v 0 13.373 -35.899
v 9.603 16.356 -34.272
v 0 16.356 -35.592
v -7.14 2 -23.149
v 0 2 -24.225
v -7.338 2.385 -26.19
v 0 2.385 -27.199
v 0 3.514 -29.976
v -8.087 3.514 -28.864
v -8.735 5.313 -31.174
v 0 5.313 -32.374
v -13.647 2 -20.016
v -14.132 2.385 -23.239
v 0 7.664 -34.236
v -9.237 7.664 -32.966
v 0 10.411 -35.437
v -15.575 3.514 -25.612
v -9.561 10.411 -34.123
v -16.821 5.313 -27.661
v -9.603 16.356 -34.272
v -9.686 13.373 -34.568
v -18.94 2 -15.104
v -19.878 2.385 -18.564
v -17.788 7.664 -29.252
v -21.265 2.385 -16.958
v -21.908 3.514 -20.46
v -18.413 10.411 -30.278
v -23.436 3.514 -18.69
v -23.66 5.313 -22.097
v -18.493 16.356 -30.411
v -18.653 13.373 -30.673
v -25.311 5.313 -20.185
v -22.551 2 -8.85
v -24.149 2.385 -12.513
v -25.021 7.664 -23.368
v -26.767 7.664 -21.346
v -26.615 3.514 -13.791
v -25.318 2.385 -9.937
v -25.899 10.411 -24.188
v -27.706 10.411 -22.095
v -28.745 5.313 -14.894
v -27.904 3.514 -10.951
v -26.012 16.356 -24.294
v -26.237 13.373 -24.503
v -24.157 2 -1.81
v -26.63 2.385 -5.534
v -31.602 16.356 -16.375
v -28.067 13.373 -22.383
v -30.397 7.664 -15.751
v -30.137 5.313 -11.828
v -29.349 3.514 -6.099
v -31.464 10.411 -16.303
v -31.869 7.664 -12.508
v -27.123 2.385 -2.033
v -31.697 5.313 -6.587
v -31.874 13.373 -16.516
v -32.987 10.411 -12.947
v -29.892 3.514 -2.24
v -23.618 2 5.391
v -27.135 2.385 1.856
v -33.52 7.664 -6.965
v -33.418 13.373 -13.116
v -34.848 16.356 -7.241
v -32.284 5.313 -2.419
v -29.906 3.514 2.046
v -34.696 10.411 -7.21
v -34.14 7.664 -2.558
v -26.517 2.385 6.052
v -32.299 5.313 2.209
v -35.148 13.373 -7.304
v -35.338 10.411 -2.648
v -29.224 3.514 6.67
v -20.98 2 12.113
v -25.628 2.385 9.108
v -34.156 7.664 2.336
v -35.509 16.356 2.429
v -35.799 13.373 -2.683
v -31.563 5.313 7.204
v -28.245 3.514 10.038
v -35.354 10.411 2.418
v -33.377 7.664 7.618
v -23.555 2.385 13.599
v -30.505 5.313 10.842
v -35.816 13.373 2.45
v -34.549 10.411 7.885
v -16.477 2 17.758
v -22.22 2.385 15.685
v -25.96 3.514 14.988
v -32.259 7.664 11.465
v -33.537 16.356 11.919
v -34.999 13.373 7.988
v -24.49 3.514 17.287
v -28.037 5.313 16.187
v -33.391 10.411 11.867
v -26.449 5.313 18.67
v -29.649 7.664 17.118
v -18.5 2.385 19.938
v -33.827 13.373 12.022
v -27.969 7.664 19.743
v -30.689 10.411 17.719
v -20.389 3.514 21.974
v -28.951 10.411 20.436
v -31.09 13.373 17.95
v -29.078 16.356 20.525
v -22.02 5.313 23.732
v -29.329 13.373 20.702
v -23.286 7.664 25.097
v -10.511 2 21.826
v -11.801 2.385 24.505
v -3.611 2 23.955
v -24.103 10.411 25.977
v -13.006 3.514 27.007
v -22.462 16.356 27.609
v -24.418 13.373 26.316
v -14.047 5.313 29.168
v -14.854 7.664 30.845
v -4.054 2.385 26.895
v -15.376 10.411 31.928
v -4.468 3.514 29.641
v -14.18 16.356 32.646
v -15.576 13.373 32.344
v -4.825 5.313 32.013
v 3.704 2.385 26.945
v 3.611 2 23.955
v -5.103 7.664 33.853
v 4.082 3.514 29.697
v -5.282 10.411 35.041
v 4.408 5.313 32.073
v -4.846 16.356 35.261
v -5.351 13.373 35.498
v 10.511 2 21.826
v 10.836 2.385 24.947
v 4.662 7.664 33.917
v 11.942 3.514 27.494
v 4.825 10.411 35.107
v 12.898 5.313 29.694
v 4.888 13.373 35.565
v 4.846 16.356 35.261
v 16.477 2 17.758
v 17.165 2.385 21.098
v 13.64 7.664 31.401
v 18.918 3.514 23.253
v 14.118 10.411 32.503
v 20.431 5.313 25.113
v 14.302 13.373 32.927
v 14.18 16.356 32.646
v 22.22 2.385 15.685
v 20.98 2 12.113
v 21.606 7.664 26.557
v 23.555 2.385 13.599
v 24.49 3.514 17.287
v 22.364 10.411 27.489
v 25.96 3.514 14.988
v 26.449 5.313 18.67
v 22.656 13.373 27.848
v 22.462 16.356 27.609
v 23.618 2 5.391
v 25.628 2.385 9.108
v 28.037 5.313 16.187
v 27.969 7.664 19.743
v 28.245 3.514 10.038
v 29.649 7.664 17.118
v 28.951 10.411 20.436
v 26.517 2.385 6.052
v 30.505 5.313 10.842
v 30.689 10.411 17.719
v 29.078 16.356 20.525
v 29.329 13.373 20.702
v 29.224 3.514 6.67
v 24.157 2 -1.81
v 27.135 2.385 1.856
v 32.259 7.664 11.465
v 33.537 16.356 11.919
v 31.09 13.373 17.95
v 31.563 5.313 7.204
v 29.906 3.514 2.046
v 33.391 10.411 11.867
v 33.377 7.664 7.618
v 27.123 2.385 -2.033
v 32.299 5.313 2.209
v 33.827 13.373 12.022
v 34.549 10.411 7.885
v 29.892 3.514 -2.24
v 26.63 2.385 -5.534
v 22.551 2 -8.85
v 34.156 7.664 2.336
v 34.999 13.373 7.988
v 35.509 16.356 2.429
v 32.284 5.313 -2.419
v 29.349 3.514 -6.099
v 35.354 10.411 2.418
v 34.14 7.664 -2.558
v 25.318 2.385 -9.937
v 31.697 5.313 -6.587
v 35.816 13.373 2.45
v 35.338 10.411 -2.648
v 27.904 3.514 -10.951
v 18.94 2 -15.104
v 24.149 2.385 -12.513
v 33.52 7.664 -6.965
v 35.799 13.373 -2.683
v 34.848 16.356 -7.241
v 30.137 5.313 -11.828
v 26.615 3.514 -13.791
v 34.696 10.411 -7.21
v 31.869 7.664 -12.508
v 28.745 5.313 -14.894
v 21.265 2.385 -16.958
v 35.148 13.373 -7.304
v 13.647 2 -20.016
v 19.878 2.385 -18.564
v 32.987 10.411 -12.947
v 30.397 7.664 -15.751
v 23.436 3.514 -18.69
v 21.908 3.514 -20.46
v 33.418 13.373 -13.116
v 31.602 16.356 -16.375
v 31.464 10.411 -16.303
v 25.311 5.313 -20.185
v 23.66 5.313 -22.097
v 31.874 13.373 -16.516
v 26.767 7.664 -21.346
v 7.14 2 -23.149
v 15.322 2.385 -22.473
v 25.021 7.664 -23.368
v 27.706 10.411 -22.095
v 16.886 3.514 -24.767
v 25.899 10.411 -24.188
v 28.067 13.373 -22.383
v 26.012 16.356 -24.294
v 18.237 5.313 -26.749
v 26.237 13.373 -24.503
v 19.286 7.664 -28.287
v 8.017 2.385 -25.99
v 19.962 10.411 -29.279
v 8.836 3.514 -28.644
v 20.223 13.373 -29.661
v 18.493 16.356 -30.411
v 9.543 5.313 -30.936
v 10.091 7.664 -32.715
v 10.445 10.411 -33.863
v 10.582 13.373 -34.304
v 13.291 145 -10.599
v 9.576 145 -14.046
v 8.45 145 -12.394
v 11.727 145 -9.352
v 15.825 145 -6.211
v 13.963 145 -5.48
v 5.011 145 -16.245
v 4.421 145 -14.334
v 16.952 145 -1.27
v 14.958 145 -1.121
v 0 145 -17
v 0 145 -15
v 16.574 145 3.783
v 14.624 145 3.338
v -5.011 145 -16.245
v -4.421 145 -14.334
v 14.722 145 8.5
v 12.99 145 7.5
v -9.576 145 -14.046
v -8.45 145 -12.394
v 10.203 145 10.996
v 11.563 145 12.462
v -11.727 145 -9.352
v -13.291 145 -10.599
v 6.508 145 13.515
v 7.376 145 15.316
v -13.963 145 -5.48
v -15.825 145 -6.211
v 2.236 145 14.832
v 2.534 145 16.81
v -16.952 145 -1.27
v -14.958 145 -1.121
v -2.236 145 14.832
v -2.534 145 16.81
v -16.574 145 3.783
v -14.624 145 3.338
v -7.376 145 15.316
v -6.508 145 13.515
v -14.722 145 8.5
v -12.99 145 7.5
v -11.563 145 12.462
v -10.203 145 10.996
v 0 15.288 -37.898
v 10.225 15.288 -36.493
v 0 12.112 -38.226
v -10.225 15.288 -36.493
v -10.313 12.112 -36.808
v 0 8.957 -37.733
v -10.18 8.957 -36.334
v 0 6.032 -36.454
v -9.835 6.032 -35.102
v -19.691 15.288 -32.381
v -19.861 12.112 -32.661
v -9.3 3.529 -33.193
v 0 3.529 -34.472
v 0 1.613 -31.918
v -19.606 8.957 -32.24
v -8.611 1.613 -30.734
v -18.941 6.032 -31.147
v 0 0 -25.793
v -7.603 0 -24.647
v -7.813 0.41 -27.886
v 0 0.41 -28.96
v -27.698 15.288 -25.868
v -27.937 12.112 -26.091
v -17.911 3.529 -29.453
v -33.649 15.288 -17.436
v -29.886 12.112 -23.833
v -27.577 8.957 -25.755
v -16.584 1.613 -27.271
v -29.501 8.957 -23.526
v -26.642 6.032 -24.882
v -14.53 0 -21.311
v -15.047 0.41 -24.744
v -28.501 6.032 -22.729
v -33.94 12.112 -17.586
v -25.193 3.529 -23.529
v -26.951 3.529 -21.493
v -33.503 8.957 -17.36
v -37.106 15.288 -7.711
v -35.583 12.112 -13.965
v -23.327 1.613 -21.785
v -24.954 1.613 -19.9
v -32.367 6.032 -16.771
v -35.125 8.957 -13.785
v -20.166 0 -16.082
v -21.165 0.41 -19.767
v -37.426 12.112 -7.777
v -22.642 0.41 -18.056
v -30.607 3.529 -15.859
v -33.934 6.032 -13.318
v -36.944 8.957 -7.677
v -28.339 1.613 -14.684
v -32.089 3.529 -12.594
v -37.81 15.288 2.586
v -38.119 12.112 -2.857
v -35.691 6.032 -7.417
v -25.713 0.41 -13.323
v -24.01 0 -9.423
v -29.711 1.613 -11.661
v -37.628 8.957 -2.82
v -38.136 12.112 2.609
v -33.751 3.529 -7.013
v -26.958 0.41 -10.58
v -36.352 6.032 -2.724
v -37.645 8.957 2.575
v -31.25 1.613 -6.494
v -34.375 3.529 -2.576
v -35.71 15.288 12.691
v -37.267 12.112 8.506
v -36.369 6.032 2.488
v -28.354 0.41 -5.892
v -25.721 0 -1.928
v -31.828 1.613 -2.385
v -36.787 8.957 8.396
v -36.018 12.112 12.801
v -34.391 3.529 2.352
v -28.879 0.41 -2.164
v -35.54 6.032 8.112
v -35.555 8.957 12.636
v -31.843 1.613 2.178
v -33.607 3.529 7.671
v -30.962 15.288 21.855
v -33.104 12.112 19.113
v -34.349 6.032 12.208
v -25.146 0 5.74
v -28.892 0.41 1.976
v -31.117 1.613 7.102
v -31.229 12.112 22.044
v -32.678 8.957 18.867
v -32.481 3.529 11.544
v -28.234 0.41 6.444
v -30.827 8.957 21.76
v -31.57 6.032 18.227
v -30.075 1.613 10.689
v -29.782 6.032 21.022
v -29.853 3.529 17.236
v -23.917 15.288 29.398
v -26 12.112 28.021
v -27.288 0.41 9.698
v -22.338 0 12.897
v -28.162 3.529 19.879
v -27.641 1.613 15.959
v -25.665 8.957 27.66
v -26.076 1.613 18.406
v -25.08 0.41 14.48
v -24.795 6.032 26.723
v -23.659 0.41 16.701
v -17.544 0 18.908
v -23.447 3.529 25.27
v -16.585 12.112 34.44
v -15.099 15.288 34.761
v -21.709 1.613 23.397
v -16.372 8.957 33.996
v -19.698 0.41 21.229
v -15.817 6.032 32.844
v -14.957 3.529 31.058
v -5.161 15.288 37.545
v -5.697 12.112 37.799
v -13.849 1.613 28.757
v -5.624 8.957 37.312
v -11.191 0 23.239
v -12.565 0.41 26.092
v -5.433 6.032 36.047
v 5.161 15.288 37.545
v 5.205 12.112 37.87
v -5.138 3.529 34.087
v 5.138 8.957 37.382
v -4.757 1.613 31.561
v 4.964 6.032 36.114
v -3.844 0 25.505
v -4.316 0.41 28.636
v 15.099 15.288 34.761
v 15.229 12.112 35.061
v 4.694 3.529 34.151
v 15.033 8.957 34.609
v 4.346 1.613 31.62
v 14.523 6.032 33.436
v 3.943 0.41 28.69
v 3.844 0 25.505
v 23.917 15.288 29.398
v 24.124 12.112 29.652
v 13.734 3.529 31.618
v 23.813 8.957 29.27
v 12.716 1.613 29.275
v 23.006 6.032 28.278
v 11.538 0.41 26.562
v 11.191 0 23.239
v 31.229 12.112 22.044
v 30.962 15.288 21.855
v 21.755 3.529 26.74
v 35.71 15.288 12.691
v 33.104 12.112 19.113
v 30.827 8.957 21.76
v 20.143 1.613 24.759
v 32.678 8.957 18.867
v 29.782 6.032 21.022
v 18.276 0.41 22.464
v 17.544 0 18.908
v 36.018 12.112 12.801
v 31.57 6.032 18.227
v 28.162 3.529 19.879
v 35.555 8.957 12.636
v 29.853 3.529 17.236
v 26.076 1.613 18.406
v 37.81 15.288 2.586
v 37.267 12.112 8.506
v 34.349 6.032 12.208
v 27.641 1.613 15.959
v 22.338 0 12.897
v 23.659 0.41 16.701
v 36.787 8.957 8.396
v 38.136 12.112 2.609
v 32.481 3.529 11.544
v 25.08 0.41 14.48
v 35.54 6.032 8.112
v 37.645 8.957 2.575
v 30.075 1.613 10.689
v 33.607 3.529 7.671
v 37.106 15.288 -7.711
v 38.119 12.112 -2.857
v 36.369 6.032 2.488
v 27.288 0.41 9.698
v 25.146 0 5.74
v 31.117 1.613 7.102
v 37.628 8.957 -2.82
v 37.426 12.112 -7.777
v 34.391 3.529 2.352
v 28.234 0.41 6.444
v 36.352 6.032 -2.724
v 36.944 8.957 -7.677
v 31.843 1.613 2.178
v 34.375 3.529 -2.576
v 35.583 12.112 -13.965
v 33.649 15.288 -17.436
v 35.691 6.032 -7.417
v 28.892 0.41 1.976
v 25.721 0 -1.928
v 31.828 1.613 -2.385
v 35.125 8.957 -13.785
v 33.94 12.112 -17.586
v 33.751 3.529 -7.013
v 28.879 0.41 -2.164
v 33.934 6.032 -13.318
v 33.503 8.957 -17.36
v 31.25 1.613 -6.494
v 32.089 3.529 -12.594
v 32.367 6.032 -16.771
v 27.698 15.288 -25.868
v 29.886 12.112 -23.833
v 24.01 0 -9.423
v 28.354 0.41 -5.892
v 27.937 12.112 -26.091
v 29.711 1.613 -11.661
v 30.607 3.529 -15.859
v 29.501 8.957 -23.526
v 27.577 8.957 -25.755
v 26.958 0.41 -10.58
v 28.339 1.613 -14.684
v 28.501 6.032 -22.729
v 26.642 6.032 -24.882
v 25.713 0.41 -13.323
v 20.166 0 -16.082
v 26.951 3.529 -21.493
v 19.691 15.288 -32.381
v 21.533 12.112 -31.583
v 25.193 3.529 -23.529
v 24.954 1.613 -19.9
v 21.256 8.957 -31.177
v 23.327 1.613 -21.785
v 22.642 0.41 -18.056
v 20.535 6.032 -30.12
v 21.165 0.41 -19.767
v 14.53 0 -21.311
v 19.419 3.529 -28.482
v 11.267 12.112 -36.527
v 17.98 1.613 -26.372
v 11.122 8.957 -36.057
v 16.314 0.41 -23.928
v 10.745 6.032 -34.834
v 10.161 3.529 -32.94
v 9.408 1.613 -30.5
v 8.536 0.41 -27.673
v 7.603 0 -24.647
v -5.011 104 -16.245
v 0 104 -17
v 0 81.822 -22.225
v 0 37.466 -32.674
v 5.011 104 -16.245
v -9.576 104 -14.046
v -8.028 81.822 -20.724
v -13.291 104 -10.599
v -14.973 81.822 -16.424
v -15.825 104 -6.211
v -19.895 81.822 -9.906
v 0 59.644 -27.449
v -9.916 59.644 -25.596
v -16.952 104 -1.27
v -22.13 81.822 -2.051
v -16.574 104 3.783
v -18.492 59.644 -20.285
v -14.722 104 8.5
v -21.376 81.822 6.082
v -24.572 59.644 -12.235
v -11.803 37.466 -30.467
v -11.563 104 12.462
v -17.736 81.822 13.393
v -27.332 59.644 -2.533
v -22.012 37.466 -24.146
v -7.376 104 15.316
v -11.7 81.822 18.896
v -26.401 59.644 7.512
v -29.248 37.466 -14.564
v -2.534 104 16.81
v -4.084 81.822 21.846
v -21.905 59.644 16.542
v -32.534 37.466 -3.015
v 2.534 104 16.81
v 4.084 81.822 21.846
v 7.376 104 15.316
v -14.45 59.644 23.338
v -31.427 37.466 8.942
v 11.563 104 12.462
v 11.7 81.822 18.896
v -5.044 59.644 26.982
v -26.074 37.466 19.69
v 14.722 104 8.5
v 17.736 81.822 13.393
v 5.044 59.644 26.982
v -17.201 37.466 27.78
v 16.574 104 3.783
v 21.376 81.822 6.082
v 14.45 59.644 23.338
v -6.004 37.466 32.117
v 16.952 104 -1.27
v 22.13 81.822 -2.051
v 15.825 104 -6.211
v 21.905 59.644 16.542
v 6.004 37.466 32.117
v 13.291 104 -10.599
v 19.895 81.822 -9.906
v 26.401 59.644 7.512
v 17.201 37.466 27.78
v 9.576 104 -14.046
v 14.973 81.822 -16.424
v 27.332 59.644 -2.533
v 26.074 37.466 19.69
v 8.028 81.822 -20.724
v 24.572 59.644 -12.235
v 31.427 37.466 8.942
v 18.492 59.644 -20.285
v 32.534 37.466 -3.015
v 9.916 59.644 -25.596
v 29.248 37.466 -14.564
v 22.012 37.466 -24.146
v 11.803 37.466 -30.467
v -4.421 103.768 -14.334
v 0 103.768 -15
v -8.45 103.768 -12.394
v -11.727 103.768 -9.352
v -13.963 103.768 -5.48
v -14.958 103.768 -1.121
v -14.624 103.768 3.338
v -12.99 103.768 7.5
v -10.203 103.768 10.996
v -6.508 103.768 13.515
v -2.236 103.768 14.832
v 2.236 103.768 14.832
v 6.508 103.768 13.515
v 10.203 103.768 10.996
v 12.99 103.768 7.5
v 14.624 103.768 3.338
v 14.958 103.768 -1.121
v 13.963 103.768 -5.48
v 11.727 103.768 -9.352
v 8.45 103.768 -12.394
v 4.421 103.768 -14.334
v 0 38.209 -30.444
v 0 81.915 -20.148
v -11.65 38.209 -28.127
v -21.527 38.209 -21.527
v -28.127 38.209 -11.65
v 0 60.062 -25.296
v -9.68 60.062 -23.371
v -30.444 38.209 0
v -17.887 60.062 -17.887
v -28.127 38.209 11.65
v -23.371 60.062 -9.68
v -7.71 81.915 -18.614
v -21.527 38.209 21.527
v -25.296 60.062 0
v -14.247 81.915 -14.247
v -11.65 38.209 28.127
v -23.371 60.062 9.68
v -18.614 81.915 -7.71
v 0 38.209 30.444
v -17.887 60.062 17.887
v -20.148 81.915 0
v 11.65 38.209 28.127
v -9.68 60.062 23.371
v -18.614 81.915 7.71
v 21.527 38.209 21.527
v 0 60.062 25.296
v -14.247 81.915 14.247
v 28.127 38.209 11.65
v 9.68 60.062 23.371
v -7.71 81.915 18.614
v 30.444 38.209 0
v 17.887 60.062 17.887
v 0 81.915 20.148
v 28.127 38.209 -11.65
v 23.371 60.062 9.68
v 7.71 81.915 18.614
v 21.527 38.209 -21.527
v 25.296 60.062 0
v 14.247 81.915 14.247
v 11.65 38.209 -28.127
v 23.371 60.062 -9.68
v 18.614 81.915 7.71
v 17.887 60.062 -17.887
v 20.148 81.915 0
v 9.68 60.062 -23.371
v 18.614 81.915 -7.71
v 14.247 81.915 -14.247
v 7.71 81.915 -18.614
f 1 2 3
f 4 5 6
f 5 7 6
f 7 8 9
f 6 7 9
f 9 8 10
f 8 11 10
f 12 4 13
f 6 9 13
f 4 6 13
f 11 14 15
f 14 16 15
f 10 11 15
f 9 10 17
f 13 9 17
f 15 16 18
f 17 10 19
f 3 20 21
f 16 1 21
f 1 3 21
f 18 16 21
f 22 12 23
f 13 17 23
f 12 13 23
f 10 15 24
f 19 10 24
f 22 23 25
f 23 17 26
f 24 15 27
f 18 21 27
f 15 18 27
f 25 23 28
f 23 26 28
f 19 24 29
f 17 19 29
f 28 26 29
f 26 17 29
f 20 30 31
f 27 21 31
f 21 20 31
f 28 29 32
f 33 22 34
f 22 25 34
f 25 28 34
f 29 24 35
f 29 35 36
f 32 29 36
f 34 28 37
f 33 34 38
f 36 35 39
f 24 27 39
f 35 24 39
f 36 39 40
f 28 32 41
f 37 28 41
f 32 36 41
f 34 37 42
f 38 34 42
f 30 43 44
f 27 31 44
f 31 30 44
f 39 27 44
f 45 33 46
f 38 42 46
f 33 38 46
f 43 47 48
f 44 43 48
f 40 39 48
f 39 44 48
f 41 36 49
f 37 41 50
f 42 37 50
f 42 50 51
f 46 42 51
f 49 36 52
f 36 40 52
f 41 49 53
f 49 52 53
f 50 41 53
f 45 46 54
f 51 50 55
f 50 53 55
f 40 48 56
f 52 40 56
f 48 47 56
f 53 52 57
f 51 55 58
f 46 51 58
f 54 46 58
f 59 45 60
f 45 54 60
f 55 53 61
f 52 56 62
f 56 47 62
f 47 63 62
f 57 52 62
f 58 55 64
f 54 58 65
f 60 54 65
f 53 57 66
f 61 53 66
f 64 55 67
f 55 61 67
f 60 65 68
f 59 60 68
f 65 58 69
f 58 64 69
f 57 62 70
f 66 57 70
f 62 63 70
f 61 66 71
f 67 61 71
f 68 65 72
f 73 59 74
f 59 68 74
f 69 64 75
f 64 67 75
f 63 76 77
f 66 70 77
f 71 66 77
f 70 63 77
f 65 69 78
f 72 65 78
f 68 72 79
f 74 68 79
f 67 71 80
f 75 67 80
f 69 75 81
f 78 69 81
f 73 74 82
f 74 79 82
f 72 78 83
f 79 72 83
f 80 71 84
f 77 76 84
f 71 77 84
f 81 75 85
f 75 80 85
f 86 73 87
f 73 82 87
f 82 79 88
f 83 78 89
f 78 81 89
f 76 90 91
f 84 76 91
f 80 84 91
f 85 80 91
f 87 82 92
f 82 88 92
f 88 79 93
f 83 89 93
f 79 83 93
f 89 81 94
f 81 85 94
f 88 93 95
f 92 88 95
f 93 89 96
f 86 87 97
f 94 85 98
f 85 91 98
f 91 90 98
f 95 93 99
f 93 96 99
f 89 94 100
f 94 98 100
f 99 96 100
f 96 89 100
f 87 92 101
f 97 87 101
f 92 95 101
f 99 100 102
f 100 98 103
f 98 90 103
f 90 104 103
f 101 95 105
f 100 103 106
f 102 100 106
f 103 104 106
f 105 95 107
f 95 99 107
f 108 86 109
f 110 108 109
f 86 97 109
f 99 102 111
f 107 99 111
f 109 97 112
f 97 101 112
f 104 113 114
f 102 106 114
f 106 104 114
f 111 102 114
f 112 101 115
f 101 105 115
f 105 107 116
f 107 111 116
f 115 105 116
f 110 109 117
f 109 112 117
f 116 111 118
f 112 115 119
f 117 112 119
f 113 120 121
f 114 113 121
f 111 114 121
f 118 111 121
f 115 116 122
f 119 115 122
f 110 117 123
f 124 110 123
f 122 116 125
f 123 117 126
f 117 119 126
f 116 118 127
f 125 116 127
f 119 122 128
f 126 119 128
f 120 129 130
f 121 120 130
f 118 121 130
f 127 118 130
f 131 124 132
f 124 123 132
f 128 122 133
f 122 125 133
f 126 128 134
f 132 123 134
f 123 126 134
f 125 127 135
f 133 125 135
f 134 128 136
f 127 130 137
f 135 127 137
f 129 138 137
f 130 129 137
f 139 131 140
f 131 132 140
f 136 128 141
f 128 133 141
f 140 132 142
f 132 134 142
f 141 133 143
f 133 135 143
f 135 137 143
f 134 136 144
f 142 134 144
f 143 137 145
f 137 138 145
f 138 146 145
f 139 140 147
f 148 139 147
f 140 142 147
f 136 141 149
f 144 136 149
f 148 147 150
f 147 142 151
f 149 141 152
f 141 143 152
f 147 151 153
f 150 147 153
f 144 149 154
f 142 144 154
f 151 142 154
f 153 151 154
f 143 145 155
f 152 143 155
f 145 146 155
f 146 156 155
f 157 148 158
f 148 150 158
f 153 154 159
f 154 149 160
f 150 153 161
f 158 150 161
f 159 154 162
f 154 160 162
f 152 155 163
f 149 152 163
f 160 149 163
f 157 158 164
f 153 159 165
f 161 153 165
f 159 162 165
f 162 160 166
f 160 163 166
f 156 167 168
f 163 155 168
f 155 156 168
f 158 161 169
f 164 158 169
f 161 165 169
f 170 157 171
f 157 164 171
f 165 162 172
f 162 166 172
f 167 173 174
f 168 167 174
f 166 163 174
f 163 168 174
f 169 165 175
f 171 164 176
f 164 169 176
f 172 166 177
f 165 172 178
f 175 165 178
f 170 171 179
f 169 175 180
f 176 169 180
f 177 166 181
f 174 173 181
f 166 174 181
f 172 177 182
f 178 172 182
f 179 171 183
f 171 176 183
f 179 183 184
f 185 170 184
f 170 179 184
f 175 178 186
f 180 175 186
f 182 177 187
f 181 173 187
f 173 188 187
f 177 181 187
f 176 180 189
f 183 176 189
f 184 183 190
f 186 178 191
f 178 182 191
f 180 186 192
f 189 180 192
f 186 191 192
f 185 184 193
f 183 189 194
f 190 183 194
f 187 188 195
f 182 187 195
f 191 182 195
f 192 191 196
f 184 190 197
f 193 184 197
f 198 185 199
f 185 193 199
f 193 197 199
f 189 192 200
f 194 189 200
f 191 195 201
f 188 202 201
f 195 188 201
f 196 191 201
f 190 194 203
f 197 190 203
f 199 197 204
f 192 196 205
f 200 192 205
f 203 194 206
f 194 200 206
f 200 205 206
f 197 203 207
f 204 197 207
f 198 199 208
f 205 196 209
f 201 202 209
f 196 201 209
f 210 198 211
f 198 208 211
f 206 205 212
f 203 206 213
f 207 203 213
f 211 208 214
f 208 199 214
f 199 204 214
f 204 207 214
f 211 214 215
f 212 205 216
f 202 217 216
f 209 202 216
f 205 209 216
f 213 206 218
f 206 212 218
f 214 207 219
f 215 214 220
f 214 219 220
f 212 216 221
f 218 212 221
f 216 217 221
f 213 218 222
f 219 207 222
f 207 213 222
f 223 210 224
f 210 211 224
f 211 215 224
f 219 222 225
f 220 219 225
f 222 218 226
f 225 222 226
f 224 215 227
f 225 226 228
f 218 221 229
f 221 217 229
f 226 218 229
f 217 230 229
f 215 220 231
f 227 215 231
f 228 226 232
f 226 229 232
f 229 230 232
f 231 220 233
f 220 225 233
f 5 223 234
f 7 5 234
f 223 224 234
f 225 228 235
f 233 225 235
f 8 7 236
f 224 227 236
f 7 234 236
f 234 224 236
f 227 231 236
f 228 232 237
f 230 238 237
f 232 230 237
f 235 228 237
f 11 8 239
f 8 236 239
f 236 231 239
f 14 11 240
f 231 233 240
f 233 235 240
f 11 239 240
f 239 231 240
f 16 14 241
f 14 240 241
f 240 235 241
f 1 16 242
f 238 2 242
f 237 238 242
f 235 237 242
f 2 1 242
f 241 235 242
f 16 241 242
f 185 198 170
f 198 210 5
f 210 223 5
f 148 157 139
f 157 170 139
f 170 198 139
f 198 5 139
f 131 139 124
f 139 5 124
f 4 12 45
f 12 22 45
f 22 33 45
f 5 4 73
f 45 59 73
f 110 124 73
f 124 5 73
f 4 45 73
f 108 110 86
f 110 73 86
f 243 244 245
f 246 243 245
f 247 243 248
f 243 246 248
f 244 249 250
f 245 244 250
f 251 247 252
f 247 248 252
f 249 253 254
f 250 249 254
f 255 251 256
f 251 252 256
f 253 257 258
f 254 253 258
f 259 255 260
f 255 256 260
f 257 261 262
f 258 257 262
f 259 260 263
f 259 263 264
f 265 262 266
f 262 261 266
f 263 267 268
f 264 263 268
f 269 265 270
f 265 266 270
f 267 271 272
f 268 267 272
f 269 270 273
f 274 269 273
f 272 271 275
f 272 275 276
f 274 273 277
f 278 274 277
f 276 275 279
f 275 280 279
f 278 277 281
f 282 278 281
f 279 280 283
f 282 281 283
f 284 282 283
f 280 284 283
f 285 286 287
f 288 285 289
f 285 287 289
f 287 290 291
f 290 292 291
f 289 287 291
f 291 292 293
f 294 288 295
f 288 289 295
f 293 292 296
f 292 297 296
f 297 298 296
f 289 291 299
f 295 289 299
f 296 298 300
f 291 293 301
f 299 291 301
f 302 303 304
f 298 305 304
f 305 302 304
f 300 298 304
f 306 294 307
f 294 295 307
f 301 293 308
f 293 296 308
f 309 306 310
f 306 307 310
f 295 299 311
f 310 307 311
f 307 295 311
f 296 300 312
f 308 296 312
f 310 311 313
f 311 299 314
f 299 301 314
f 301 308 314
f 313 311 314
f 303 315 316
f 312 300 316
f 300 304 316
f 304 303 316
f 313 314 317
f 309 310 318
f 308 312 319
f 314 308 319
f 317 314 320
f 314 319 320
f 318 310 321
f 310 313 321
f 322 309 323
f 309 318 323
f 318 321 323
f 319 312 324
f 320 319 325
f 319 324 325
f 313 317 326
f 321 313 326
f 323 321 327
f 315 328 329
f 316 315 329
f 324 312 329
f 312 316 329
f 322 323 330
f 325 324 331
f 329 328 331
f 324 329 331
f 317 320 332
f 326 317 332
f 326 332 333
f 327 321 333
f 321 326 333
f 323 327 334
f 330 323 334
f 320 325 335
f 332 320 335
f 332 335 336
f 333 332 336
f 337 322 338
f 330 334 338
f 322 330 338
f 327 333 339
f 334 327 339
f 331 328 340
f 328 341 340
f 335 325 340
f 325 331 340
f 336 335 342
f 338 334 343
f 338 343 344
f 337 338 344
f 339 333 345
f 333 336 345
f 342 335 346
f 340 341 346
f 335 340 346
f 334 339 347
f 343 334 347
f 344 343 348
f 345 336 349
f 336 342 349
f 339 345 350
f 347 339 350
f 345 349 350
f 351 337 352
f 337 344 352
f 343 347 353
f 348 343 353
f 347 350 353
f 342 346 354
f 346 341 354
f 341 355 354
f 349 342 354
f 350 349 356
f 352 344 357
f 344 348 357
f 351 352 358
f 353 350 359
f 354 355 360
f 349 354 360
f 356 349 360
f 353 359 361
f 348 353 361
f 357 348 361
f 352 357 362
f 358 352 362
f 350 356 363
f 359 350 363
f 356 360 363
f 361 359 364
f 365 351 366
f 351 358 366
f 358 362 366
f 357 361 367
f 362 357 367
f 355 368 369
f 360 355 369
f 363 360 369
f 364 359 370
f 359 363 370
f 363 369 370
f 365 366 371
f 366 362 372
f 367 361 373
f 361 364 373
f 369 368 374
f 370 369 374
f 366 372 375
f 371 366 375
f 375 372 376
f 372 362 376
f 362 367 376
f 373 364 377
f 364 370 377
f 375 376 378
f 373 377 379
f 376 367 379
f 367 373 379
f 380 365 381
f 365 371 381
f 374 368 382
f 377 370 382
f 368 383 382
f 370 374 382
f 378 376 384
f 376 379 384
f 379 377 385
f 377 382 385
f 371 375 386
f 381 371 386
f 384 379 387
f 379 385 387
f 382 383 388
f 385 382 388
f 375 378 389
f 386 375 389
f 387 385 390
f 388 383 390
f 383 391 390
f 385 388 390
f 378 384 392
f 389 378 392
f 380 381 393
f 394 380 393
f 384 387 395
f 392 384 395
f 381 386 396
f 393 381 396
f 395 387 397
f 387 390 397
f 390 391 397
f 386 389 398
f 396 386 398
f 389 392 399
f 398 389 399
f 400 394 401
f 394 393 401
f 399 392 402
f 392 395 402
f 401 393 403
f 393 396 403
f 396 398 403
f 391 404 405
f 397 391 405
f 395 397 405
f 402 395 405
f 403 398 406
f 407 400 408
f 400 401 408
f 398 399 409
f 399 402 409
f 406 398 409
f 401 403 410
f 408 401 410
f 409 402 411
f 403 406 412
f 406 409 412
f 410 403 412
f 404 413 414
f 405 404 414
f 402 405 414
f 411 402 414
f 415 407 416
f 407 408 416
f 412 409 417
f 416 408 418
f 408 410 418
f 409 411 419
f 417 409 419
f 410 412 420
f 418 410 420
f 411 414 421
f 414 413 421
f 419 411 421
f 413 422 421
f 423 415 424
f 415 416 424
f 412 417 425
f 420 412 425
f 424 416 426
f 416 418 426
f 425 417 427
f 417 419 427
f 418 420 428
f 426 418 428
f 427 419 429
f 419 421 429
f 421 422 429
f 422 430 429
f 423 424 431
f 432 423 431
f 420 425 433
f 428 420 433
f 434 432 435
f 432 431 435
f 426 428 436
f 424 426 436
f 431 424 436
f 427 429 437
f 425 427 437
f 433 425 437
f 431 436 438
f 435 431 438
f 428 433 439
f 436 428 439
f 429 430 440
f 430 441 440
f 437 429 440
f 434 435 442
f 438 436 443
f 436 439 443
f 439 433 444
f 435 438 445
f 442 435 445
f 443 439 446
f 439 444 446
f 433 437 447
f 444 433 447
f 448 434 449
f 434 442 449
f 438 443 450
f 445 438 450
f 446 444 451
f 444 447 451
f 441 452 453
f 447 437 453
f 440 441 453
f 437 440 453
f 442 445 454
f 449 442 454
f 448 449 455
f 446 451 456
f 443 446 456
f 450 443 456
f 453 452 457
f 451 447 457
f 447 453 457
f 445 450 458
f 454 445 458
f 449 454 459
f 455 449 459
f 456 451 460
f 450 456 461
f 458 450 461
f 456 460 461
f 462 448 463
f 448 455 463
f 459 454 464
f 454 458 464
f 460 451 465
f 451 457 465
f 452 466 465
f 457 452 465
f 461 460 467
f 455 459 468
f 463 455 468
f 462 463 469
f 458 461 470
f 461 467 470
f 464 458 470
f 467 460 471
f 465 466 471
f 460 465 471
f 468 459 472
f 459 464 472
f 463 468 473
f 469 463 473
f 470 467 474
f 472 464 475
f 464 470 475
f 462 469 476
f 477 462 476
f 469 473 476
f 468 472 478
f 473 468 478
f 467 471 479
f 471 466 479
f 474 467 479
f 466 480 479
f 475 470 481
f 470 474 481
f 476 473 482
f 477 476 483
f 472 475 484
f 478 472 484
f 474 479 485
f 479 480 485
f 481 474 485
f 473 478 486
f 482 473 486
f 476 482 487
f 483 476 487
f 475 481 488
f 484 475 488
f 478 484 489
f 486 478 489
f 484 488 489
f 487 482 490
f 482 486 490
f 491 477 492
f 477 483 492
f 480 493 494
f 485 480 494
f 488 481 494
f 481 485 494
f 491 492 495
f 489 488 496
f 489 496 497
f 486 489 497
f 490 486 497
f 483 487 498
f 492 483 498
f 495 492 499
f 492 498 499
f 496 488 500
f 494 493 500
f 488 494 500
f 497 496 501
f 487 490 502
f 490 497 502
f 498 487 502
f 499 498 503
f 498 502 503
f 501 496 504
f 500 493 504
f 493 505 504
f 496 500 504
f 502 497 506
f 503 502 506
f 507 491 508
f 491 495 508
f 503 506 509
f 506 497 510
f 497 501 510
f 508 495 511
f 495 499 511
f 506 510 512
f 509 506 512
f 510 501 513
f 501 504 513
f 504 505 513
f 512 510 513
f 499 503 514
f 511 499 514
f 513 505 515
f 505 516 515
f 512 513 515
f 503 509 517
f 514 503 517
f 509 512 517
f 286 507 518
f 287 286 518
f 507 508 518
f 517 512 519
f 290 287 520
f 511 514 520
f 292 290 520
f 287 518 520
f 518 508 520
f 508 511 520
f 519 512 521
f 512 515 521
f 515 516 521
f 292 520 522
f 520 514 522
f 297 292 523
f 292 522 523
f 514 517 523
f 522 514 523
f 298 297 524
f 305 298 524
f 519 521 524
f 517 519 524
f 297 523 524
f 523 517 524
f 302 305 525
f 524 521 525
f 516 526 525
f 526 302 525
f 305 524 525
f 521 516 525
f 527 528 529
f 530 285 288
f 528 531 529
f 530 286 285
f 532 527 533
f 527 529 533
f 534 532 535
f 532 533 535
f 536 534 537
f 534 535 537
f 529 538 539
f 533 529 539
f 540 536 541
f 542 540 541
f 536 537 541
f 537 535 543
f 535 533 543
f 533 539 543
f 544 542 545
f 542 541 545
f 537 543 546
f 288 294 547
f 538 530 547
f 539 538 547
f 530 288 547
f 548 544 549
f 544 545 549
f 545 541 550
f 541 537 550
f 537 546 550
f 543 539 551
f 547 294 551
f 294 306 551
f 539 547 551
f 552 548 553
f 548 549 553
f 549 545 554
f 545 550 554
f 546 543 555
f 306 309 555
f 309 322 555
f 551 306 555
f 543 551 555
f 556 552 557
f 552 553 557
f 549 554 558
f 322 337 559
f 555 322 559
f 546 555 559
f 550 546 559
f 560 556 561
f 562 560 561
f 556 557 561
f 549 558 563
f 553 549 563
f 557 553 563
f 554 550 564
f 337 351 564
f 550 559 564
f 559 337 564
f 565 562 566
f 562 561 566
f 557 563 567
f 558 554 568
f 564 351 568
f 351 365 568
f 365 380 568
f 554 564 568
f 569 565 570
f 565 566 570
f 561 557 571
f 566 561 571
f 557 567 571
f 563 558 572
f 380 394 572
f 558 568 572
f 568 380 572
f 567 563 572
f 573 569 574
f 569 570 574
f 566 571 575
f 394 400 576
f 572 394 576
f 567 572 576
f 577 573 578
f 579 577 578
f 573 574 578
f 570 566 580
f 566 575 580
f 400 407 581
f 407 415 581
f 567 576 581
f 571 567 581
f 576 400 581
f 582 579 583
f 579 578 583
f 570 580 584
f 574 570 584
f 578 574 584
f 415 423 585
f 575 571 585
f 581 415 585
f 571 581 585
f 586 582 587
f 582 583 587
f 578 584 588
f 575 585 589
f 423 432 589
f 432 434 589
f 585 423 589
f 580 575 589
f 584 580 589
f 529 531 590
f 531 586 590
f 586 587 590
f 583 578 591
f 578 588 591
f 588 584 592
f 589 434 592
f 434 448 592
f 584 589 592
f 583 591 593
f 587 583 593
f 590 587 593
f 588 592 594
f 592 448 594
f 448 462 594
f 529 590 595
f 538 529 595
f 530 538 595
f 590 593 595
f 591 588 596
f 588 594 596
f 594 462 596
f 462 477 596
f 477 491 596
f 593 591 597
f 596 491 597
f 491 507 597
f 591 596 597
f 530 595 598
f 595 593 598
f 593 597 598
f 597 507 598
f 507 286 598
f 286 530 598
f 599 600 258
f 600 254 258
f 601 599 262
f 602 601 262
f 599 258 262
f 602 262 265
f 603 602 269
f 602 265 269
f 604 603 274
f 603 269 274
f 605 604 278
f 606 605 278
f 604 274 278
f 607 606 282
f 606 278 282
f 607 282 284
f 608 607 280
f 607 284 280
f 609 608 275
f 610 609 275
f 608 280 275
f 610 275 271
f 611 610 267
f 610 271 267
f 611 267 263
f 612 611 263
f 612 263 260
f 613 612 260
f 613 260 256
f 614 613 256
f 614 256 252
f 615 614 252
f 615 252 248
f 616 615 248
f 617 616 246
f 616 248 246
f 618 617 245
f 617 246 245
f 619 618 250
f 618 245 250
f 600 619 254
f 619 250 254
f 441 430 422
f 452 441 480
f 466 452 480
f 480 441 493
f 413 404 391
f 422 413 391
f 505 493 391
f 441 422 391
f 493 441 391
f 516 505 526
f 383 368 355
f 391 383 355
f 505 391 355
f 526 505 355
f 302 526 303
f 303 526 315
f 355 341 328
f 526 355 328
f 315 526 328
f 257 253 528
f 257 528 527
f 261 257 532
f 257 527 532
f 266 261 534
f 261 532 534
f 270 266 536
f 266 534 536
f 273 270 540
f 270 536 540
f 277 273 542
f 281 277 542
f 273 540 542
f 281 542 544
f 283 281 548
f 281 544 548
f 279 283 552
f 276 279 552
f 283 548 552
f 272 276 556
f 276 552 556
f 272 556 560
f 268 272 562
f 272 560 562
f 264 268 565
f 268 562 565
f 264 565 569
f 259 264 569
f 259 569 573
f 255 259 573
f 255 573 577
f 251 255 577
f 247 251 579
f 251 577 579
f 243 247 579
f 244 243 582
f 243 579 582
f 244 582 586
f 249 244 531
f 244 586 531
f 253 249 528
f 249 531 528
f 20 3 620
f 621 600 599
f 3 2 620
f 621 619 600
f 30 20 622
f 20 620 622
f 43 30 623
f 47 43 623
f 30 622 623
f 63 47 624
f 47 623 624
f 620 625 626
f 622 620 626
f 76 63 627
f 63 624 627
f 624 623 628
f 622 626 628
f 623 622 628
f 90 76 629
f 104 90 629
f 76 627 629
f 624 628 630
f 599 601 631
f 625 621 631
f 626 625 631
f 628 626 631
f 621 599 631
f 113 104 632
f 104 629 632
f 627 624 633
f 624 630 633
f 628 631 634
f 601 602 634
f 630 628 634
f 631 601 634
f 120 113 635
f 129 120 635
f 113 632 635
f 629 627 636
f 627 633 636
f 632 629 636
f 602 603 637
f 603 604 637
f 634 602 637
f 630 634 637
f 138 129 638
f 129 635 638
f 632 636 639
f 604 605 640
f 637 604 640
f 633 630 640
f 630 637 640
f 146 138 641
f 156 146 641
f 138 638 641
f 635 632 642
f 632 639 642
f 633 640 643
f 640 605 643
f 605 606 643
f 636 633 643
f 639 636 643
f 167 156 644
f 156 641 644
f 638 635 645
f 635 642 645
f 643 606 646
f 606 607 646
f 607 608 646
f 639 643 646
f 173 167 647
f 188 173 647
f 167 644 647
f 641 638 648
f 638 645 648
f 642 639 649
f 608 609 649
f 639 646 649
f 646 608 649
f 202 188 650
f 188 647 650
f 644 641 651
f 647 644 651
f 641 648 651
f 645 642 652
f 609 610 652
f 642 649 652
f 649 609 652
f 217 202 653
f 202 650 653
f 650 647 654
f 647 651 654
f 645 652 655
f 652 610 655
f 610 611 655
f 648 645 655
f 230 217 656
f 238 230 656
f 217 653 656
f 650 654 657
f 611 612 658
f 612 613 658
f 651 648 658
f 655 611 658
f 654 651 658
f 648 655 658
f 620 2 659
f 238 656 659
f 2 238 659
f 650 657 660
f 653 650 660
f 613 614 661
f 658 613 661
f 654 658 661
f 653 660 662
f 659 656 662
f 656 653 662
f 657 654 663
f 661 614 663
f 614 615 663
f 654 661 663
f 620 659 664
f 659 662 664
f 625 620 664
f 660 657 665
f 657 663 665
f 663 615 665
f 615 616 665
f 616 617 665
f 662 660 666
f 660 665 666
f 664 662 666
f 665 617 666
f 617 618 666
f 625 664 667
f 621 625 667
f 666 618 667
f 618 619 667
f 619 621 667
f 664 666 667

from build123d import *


with BuildPart() as part:
    # Croquis2 → Revolución1 (revolve)
    with BuildSketch(Plane.XY, mode=Mode.PRIVATE) as revoluci_n1_sk:
        with BuildLine():
            Line((17, 145), (17, 104))
            Line((17, 104), (37.898418039, 15.288347915))
            ThreePointArc((37.898418039, 15.288347915), (35.543424025, 4.716396984), (25.793155167, 0))
            Line((25.793155167, 0), (0, 0))
            Line((0, 0), (0, 2))
            Line((0, 2), (24.225162721, 2))
            ThreePointArc((24.225162721, 2), (33.380794894, 6.428759514), (35.592165604, 16.355962086))
            Line((35.592165604, 16.355962086), (15, 103.767603835))
            Line((15, 103.767603835), (15, 145))
            Line((15, 145), (17, 145))
        make_face()
    revolve(revoluci_n1_sk.sketch.rotate(Axis((0, 0, 0), (0, 1, 0)), 90), axis=Axis((0, 0, 0), (0, 1, 0)))


solid = part.part
